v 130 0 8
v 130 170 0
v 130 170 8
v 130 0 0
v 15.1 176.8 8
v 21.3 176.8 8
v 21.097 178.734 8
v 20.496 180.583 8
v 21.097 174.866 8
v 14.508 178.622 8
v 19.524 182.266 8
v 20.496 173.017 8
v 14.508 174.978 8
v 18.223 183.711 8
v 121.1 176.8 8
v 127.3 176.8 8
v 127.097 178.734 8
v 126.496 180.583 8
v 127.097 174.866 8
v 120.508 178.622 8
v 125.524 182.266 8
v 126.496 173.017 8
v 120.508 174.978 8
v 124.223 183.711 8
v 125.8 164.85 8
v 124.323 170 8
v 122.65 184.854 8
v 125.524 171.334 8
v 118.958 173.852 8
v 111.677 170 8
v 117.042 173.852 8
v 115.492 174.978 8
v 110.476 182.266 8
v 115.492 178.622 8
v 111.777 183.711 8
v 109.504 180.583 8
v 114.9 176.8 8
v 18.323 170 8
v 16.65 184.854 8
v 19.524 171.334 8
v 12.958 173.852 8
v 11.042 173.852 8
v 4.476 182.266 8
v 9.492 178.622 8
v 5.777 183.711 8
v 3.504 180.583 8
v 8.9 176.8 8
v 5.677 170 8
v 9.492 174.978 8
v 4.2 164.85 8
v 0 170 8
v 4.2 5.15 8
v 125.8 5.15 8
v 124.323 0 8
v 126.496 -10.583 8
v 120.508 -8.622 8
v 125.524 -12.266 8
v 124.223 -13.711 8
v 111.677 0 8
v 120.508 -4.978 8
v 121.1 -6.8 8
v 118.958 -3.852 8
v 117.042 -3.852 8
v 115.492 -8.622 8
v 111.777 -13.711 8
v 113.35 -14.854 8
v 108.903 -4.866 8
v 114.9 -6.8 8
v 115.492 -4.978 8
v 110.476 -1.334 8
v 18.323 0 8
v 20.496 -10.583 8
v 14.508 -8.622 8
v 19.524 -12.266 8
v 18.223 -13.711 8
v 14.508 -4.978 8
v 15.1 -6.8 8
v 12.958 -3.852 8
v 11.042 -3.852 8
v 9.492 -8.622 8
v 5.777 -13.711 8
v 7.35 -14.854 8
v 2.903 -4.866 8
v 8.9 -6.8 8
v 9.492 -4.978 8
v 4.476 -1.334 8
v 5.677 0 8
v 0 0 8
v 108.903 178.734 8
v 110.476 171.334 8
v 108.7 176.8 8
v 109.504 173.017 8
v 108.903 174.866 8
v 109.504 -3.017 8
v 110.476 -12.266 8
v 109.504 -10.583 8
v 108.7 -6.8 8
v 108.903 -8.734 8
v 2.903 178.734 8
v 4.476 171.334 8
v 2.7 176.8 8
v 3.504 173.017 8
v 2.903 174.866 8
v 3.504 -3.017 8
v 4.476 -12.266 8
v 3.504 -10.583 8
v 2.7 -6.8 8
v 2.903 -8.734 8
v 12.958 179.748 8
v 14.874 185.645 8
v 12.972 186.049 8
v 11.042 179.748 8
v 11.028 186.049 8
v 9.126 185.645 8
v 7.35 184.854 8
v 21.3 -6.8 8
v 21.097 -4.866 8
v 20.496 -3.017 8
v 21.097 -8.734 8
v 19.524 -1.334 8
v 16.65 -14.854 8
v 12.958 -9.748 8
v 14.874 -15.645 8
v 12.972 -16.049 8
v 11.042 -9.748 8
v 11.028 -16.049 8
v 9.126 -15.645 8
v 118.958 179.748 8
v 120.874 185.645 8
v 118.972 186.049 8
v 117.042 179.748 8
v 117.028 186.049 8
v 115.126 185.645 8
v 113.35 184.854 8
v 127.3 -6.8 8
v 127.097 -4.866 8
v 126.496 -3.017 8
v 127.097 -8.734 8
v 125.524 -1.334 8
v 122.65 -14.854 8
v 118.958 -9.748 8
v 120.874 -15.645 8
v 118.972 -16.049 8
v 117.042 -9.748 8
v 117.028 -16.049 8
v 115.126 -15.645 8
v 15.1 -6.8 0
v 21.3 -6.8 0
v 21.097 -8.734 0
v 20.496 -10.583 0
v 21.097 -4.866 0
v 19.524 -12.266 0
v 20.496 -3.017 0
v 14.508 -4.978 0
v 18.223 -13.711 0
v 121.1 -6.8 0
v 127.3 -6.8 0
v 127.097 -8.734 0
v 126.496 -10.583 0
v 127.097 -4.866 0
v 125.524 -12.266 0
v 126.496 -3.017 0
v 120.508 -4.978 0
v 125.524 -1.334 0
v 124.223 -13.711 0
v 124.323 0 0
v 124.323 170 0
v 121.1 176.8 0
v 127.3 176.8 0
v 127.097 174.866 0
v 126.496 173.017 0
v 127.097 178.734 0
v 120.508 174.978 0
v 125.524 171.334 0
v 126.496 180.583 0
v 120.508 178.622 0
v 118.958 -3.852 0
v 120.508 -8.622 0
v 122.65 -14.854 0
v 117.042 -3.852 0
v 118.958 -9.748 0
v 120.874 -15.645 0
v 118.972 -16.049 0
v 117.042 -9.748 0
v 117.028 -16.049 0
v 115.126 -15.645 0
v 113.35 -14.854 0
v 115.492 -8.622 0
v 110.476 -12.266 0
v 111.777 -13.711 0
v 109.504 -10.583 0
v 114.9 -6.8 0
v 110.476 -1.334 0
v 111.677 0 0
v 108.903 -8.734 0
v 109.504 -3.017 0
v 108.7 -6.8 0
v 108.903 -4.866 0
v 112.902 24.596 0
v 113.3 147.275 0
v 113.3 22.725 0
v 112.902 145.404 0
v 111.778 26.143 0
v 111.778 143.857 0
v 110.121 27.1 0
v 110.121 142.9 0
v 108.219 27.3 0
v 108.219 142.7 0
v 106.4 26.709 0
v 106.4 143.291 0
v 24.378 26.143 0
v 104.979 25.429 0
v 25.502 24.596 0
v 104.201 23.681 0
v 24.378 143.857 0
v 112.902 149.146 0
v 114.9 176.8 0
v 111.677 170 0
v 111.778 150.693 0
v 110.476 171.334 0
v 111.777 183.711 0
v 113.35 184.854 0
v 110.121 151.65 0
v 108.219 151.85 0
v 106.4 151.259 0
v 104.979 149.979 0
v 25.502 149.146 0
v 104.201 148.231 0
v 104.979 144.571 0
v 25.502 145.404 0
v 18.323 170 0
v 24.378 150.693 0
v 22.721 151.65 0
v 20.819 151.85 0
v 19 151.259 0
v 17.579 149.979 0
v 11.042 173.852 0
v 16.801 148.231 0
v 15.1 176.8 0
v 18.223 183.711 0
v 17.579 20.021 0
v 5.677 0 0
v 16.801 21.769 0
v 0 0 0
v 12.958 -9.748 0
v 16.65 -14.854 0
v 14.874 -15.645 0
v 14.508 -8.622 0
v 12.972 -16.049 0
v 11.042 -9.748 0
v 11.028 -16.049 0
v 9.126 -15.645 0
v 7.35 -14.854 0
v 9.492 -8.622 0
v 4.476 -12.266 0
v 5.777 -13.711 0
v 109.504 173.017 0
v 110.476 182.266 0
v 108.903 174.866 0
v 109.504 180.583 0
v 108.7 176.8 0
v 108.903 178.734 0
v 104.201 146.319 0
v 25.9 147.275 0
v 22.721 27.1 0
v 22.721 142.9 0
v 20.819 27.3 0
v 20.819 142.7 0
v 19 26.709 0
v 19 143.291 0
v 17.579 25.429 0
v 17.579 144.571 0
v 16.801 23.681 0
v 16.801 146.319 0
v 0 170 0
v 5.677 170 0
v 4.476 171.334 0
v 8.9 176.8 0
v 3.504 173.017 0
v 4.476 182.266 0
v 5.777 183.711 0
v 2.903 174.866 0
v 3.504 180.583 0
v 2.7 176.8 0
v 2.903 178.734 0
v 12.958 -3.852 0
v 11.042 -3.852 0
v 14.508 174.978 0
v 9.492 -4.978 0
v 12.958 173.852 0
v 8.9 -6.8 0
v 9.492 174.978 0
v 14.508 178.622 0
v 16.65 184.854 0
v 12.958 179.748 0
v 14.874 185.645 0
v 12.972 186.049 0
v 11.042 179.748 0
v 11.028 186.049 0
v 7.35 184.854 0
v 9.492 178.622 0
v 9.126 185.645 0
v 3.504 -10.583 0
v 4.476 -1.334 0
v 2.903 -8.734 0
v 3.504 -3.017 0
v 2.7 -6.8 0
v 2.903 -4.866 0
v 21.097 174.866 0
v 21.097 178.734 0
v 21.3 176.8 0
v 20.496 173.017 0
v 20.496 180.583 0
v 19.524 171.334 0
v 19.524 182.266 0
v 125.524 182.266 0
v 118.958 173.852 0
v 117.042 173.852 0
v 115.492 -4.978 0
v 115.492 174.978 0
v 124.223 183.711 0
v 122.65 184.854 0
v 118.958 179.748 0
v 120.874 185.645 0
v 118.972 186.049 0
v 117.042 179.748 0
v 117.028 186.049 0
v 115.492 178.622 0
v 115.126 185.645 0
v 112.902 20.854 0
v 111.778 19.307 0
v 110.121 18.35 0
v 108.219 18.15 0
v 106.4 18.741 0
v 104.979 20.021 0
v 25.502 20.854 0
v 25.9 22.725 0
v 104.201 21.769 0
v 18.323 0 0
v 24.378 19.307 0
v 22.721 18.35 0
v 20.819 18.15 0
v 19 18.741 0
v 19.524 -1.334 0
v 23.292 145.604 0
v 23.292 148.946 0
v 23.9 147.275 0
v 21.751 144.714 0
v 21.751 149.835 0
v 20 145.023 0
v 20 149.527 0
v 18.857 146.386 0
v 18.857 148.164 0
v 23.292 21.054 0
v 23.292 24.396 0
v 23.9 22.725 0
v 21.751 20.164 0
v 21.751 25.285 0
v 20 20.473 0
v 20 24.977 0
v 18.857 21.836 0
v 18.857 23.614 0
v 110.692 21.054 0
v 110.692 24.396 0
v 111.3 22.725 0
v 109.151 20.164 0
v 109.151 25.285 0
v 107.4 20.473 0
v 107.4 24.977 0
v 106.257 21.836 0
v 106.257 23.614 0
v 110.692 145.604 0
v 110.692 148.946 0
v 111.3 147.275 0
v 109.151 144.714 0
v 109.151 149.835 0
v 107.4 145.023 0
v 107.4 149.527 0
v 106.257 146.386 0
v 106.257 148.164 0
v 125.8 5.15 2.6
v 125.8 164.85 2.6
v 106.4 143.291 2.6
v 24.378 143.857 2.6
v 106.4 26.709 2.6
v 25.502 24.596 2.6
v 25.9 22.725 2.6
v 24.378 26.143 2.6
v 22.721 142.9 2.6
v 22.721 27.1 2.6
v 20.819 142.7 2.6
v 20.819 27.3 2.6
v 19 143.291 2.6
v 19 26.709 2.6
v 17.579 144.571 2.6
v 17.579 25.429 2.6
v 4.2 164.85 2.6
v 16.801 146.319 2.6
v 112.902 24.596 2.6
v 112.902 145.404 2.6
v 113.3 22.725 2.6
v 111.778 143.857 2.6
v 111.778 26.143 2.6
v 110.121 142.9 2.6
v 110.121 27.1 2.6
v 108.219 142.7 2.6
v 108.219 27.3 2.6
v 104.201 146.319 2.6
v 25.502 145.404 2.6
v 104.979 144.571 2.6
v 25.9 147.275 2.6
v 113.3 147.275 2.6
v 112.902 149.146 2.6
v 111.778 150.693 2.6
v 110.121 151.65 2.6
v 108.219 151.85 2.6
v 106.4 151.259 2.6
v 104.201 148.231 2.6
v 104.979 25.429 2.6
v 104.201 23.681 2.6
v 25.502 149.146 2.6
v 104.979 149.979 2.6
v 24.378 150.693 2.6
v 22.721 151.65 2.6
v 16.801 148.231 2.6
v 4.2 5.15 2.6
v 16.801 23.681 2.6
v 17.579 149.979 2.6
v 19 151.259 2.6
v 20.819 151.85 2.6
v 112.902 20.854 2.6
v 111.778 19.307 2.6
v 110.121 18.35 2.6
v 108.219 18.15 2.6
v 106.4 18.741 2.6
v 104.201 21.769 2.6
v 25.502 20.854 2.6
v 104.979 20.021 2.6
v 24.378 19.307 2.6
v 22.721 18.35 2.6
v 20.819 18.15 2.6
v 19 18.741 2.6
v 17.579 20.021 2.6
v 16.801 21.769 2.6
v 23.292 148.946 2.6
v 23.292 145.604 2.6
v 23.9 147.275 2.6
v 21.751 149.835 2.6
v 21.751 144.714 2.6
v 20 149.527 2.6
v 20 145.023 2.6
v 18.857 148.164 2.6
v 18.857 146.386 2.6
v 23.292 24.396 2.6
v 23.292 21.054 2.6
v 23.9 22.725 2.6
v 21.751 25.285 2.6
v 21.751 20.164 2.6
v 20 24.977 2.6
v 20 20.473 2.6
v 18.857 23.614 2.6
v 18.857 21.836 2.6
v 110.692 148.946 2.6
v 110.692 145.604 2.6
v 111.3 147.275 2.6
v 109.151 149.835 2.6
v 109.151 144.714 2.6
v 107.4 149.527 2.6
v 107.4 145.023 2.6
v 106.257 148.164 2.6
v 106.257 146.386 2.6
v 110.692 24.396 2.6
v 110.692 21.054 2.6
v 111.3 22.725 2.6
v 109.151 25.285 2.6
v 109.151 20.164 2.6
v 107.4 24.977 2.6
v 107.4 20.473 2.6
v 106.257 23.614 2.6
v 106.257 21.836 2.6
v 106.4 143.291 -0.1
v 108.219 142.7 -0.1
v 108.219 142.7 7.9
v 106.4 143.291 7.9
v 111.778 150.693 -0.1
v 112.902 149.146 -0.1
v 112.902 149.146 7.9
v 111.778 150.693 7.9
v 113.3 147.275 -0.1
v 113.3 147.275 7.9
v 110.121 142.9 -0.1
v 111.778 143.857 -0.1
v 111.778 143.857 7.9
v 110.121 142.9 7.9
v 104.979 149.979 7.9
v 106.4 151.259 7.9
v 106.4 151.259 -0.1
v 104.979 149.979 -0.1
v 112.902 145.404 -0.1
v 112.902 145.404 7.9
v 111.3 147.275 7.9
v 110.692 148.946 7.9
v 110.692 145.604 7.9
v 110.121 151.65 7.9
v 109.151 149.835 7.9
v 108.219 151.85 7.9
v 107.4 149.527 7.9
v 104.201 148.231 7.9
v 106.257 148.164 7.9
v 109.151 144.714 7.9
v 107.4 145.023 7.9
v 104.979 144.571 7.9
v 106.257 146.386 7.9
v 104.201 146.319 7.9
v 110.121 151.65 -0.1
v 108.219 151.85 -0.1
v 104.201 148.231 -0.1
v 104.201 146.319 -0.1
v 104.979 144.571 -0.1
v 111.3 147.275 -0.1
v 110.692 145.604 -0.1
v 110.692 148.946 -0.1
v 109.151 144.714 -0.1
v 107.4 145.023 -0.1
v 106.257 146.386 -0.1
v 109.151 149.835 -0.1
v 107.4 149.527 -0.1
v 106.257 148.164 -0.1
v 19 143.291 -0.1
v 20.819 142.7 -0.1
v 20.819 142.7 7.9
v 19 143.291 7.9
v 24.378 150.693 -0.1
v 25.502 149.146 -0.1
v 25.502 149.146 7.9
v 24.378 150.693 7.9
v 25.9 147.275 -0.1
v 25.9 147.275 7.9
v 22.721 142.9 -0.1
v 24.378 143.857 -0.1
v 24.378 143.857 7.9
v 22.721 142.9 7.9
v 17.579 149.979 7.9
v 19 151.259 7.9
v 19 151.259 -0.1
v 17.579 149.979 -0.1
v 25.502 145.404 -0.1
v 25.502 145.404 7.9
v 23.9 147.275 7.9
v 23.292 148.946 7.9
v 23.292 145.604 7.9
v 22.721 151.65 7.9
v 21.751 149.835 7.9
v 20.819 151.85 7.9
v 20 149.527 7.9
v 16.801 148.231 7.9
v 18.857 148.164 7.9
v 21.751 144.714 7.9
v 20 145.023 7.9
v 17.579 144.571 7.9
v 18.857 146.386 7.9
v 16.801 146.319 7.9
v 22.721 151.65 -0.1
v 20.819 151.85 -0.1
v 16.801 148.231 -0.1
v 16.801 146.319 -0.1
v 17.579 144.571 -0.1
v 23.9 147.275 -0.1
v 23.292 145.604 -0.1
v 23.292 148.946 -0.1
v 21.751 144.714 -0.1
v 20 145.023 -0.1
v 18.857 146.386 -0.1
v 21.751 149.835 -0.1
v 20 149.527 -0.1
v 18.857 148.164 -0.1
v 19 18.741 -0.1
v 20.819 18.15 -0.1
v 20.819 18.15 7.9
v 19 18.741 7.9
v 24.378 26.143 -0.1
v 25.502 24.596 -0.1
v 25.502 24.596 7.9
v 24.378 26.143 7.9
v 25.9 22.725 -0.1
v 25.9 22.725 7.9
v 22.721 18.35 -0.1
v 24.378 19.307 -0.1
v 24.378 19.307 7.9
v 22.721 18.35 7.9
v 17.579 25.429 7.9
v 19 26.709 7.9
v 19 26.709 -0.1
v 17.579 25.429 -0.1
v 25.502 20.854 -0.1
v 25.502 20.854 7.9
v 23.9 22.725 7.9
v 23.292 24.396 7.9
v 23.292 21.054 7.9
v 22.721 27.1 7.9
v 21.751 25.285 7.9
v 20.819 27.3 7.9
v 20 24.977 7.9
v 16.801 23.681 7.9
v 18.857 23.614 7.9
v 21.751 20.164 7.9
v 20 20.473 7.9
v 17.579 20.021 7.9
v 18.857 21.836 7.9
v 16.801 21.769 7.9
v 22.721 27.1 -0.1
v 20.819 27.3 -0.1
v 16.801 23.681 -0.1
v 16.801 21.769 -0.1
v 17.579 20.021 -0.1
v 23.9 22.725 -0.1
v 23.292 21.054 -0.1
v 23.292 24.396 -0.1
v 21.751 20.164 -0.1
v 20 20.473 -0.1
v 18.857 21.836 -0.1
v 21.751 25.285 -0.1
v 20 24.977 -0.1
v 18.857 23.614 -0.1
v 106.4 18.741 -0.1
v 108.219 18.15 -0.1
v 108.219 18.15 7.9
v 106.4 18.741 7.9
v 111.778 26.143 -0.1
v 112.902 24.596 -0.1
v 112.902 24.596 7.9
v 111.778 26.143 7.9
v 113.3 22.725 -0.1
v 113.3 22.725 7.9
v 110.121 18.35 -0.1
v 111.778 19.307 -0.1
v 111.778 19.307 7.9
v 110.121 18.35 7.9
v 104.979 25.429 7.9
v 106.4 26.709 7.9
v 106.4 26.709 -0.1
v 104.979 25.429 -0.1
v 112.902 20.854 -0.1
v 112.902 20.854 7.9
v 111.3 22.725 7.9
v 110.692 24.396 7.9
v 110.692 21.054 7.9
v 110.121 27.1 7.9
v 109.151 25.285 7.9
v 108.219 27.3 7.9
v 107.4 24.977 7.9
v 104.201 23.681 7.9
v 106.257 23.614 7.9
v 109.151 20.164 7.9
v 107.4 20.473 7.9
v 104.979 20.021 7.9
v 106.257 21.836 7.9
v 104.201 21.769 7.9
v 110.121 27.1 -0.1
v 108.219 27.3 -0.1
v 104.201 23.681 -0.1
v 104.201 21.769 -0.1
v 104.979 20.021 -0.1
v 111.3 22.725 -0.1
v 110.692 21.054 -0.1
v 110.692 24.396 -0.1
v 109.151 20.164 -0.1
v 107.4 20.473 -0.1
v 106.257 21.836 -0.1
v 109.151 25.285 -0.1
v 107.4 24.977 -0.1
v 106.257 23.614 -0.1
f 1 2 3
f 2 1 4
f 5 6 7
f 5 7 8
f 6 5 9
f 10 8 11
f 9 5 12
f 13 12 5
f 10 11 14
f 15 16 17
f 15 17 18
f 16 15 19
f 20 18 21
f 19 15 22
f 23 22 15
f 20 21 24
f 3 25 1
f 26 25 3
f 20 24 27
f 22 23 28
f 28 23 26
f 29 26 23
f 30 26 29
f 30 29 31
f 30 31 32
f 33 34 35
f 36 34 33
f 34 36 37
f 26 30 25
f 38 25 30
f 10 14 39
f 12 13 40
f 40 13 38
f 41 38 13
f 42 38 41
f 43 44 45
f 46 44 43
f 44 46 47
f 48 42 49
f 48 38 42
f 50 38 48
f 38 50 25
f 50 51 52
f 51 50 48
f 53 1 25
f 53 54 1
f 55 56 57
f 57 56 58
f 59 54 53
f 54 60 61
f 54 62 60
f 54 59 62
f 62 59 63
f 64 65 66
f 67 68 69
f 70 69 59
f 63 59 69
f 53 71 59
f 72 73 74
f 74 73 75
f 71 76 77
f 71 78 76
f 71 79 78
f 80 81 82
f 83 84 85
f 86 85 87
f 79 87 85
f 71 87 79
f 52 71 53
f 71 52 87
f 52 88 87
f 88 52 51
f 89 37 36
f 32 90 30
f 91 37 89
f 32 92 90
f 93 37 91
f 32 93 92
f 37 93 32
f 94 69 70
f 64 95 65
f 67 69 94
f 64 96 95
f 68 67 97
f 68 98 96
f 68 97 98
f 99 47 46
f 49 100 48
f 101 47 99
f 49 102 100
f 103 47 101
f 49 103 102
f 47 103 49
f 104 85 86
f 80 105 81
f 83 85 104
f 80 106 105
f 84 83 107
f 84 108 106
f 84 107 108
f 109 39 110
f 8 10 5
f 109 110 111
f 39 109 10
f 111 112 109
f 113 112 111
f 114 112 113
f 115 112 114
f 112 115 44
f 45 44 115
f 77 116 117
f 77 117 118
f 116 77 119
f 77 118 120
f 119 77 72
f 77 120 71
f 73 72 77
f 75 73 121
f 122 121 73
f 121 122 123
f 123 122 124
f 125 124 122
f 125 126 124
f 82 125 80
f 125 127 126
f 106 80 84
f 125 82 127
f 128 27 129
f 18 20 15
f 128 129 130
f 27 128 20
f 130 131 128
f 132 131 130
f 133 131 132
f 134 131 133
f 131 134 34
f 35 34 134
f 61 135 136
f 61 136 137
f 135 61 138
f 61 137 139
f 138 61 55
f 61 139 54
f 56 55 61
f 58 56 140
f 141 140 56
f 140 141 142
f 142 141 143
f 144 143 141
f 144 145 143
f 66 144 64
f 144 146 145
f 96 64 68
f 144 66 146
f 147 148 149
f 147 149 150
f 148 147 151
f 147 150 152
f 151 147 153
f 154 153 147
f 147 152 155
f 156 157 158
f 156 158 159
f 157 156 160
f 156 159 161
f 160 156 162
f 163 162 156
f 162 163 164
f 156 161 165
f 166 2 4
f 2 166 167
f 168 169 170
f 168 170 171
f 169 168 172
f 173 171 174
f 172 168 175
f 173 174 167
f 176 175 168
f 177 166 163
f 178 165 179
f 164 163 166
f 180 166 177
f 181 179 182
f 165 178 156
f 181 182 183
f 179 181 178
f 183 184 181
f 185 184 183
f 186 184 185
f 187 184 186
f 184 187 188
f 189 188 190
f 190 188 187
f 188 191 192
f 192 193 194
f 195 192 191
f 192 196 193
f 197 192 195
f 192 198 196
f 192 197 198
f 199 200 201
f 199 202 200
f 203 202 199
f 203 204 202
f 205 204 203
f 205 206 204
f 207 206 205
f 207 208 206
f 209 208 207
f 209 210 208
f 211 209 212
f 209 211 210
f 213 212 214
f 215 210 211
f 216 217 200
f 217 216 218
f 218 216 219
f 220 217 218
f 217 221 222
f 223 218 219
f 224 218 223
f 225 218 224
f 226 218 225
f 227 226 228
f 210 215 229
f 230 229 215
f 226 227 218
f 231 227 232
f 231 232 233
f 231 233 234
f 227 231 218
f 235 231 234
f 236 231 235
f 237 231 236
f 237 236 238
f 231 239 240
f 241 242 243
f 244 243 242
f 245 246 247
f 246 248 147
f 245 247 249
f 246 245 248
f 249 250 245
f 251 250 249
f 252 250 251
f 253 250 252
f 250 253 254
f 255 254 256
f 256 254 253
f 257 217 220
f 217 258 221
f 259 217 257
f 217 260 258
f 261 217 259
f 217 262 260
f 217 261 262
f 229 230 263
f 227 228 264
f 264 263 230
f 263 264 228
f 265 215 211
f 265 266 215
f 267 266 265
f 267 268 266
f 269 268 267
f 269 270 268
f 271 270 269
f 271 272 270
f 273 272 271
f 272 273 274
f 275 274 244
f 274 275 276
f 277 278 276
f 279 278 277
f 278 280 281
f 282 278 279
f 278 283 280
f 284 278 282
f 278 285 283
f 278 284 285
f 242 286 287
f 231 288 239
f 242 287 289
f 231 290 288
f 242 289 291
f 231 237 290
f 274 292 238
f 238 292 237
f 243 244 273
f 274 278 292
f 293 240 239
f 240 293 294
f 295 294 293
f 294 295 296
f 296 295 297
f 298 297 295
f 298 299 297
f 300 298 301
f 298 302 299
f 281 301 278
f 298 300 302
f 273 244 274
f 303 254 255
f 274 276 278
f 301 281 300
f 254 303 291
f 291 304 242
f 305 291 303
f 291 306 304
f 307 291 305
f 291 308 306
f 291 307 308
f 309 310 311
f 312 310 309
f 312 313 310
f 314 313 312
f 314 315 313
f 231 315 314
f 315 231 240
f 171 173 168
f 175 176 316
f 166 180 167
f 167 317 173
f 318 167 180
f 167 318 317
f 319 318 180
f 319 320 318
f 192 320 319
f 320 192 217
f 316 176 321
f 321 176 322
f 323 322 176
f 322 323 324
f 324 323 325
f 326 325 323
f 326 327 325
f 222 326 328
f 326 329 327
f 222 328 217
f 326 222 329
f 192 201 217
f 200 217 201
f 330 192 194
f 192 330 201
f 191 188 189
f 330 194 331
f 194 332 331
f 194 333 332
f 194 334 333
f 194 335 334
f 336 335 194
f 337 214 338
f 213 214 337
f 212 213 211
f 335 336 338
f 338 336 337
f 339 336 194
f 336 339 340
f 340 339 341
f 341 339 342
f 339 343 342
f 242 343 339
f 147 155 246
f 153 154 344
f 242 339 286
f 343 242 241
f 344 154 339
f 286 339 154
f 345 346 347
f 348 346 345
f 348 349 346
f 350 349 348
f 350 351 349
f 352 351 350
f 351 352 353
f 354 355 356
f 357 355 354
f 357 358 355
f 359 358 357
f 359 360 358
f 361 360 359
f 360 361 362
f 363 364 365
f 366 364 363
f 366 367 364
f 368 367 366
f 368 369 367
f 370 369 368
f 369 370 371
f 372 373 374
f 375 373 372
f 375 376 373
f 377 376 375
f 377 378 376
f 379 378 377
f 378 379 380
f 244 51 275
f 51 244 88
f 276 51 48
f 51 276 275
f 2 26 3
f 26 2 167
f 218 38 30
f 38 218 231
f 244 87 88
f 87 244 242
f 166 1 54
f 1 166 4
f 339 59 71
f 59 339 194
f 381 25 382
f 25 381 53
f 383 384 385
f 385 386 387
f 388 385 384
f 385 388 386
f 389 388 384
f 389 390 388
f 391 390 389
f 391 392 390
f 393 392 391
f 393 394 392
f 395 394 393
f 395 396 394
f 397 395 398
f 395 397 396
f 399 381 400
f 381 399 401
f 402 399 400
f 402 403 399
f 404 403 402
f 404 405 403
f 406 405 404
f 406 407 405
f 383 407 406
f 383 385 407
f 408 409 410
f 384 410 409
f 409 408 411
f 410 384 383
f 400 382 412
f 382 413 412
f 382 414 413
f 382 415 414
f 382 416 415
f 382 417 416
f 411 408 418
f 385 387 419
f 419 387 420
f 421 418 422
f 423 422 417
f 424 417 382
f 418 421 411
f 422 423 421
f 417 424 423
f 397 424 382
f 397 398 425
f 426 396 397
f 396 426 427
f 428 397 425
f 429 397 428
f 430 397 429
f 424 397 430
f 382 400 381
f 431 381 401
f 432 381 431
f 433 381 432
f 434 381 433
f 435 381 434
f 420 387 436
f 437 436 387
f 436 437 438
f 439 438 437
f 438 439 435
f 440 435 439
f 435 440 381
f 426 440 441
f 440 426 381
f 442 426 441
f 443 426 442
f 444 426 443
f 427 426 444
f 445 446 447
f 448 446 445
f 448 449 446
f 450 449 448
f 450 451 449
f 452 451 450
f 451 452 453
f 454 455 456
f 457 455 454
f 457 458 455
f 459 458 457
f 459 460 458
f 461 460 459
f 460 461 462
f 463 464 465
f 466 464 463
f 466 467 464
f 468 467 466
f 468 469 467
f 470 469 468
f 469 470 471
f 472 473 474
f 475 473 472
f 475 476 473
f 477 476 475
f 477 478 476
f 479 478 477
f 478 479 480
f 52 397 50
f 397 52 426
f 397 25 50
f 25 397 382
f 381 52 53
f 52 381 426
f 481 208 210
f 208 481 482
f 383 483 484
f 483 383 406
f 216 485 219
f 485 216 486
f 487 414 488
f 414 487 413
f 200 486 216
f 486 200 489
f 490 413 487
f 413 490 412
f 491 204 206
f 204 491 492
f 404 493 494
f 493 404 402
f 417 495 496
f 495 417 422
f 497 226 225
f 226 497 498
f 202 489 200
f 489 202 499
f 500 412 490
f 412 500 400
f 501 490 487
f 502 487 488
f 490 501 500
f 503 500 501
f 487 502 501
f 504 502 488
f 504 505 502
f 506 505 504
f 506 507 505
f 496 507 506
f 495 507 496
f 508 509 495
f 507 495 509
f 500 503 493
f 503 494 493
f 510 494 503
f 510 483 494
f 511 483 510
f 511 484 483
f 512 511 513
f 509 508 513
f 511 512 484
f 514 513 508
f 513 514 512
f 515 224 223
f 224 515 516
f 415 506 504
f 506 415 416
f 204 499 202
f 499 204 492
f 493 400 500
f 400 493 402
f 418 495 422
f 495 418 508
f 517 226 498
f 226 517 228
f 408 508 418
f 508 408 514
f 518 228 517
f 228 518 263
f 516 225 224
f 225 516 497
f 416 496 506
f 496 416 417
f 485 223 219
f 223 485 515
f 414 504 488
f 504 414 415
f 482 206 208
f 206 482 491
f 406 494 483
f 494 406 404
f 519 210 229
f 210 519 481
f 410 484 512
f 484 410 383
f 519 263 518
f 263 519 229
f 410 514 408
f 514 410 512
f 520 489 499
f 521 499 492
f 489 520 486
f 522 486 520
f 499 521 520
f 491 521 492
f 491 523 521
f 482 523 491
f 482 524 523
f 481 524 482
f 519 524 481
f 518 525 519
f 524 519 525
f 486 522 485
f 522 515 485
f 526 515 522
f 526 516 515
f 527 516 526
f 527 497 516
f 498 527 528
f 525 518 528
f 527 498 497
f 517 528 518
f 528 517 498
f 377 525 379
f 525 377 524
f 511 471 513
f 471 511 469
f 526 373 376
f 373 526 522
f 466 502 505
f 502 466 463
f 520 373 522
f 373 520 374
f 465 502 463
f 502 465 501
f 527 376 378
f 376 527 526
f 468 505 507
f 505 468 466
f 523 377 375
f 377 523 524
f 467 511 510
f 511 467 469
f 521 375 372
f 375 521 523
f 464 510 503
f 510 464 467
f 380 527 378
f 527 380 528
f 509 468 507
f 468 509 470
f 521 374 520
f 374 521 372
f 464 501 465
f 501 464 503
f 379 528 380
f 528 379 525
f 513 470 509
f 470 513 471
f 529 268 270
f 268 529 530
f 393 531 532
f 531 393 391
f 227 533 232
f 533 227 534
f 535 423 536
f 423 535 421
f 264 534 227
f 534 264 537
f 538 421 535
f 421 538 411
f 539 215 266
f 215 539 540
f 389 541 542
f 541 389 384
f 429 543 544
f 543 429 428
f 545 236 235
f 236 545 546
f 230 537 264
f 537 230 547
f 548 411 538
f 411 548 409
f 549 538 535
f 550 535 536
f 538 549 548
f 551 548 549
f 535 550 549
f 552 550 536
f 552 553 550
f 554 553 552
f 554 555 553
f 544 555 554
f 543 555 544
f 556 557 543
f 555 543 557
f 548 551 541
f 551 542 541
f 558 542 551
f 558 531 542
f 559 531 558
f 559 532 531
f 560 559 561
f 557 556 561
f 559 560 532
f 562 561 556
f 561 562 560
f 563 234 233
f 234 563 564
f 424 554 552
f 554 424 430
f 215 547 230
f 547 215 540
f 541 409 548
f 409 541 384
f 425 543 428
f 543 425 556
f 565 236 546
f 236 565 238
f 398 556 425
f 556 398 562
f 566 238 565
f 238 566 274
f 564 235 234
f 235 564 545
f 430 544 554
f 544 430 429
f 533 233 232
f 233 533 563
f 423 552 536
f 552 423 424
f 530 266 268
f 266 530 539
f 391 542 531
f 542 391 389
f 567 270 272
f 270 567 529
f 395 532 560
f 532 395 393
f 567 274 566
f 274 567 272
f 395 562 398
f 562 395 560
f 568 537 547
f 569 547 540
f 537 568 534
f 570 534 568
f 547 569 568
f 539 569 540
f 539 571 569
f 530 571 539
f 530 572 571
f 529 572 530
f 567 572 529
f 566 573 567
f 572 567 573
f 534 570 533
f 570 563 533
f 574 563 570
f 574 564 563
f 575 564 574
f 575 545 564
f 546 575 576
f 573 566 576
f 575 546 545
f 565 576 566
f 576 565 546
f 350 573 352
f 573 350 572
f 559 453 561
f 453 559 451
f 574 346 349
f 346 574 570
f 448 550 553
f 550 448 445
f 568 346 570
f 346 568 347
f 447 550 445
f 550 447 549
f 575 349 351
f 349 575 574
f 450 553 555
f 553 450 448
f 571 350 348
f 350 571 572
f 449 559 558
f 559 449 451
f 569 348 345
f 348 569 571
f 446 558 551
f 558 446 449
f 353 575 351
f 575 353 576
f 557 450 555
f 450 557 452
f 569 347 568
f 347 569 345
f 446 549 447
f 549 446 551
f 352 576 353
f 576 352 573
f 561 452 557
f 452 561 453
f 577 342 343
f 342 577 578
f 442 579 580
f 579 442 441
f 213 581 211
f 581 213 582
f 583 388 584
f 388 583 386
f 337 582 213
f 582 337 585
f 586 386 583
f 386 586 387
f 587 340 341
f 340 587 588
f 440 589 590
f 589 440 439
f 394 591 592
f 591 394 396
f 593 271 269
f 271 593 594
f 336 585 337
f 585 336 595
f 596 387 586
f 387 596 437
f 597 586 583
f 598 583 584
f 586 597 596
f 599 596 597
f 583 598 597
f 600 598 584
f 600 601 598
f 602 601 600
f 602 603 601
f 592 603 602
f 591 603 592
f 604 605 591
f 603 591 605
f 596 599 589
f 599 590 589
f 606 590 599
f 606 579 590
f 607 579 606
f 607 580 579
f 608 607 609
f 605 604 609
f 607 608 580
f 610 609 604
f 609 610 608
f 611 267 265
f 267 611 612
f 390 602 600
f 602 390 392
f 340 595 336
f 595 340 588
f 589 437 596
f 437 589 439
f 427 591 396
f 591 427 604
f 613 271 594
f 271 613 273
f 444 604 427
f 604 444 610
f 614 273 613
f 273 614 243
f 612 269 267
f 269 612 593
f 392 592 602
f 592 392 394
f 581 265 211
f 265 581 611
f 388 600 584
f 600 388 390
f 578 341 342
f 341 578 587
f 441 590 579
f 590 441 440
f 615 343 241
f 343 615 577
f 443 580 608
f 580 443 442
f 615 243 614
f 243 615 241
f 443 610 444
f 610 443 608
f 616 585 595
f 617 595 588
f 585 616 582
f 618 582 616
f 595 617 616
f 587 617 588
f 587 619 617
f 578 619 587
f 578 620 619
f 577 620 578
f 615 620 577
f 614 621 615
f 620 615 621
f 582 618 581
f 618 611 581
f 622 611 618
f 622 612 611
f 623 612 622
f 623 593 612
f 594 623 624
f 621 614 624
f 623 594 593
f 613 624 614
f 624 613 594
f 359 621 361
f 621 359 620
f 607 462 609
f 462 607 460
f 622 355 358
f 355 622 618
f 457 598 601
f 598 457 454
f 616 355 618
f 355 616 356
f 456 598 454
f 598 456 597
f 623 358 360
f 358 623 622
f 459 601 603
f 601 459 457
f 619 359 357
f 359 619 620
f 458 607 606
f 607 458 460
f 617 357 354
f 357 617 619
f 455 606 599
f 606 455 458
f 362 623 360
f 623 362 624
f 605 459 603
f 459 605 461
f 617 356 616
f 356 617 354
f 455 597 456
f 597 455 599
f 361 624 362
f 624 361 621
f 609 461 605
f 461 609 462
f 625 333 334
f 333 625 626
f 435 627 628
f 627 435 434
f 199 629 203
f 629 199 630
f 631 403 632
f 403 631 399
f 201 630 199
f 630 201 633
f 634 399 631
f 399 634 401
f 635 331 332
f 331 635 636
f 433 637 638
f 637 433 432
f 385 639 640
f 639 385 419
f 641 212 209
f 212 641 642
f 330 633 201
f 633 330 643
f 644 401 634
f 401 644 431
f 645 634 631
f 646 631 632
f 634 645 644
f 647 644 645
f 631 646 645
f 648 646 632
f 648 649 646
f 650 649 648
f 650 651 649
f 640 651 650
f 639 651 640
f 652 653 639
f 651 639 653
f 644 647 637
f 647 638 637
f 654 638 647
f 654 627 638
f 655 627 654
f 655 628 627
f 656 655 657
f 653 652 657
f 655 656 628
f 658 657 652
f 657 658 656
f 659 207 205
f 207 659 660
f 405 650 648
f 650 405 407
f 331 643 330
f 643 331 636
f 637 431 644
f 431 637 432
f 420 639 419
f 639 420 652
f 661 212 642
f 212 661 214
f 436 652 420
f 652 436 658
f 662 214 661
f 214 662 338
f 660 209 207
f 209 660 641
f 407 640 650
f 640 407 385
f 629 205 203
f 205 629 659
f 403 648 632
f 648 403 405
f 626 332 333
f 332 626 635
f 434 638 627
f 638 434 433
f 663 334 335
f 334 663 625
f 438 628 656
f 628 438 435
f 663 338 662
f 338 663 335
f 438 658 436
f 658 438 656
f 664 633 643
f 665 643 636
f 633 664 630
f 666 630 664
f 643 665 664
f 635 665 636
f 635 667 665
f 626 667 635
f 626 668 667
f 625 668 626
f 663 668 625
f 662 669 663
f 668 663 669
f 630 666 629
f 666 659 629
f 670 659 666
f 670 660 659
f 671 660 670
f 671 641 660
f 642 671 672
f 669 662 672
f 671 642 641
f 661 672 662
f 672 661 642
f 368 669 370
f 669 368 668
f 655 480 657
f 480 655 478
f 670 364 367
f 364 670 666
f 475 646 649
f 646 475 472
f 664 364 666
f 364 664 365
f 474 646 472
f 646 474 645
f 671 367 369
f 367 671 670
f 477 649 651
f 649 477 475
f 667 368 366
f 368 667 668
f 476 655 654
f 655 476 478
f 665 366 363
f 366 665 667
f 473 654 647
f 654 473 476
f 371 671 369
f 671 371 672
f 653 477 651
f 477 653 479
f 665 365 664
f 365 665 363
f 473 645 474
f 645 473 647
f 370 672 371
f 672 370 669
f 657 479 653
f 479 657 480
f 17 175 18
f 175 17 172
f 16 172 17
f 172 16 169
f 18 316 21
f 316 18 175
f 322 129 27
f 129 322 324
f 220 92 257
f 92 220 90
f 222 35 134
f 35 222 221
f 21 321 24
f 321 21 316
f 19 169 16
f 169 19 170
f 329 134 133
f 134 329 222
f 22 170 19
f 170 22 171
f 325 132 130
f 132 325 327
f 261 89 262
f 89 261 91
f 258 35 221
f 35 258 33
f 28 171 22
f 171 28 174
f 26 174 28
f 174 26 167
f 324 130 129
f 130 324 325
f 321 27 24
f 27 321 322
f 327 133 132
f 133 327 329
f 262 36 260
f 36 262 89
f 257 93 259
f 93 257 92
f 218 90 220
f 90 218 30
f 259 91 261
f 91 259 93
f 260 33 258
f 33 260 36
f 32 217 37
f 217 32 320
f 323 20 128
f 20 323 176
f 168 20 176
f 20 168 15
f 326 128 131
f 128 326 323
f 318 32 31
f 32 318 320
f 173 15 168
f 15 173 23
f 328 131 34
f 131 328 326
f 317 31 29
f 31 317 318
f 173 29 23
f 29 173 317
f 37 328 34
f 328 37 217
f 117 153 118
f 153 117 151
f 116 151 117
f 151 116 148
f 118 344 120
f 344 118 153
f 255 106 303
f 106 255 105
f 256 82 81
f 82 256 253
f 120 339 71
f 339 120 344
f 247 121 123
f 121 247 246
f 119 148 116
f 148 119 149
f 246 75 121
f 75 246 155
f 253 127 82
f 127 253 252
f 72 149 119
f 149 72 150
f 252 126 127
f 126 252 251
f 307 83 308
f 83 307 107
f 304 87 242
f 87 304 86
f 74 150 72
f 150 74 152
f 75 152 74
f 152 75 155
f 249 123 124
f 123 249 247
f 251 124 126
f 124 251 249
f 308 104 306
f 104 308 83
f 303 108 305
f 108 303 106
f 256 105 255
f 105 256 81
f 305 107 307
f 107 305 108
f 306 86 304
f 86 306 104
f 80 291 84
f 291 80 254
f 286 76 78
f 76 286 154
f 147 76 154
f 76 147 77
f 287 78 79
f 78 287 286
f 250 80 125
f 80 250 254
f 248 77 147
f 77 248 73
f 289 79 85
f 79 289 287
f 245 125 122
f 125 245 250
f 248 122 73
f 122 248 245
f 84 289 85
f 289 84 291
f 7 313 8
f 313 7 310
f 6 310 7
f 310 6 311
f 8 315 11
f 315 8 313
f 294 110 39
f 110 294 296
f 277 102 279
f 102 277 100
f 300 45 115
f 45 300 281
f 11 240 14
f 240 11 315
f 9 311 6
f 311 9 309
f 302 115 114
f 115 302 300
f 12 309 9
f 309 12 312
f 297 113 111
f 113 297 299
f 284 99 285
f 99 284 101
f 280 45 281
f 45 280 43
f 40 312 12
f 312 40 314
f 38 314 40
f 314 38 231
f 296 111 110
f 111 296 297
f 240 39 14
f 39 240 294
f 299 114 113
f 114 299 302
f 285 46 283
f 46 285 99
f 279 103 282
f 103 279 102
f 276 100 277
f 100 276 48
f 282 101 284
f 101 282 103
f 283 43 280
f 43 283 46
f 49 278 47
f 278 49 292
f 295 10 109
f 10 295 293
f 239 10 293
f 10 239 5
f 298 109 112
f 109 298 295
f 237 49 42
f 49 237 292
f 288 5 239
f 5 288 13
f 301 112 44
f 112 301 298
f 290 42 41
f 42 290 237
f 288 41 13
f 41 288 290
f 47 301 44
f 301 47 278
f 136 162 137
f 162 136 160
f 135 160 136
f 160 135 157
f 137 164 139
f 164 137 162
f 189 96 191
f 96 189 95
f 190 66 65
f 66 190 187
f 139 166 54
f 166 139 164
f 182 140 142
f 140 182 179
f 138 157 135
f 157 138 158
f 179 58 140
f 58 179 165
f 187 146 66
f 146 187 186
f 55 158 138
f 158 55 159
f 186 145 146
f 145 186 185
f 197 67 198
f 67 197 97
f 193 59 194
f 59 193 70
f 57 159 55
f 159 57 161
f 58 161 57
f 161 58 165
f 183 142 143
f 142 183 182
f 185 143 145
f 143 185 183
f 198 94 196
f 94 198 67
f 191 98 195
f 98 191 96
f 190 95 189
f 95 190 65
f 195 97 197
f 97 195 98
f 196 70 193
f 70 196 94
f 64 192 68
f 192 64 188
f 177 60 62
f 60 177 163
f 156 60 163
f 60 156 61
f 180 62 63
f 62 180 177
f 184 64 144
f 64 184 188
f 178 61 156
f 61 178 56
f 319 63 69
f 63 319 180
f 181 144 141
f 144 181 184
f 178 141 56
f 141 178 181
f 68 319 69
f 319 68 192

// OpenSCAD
//Frame dimensions
l = 130;
w = 170;
r = 4;
h1 = 8;

//PCB dimensions
lp = 101.6; // 4"
wp = 139.7; // 5.5"


l2 = lp+20;
w2 = wp+20;
h2 = 5.5;

//Screw radius
sc = 3.1; // 0.25"

//through-hole radius
th = 2.6; //2.6mm

module foot() {
	difference(){
		cylinder(h = h1, r=sc*3);
		translate([0,0,-0.1])cylinder(h = h1+1, r=sc);
	}

}

module standoff(){
	difference(){
		cylinder(h=h1, r=th+2);
		cylinder(h=h1+2, r = th);
	}
}

module base(){
	difference(){
		cube([l,w,h1]);
		translate([(l-l2)/2, (w-w2)/2, h1-h2+0.1])cube([l2,w2,h2]);
	}
	translate([lp+(l-lp)/4,wp+(w-wp)/4,-0.1])standoff();
	translate([3*(l-lp)/4,wp+(w-wp)/4,-0.1])standoff();
	translate([3*(l-lp)/4,3*(w-wp)/4,-0.1])standoff();
	translate([lp+(l-lp)/4,3*(w-wp)/4,-0.1])standoff();
	
	translate([l-3*r,w+1.7*r,0])foot();
	translate([0+3*r,0-1.7*r,0])foot();
	translate([0+3*r,w+1.7*r,0])foot();
	translate([l-3*r,0-1.7*r,0])foot();

}

base();
